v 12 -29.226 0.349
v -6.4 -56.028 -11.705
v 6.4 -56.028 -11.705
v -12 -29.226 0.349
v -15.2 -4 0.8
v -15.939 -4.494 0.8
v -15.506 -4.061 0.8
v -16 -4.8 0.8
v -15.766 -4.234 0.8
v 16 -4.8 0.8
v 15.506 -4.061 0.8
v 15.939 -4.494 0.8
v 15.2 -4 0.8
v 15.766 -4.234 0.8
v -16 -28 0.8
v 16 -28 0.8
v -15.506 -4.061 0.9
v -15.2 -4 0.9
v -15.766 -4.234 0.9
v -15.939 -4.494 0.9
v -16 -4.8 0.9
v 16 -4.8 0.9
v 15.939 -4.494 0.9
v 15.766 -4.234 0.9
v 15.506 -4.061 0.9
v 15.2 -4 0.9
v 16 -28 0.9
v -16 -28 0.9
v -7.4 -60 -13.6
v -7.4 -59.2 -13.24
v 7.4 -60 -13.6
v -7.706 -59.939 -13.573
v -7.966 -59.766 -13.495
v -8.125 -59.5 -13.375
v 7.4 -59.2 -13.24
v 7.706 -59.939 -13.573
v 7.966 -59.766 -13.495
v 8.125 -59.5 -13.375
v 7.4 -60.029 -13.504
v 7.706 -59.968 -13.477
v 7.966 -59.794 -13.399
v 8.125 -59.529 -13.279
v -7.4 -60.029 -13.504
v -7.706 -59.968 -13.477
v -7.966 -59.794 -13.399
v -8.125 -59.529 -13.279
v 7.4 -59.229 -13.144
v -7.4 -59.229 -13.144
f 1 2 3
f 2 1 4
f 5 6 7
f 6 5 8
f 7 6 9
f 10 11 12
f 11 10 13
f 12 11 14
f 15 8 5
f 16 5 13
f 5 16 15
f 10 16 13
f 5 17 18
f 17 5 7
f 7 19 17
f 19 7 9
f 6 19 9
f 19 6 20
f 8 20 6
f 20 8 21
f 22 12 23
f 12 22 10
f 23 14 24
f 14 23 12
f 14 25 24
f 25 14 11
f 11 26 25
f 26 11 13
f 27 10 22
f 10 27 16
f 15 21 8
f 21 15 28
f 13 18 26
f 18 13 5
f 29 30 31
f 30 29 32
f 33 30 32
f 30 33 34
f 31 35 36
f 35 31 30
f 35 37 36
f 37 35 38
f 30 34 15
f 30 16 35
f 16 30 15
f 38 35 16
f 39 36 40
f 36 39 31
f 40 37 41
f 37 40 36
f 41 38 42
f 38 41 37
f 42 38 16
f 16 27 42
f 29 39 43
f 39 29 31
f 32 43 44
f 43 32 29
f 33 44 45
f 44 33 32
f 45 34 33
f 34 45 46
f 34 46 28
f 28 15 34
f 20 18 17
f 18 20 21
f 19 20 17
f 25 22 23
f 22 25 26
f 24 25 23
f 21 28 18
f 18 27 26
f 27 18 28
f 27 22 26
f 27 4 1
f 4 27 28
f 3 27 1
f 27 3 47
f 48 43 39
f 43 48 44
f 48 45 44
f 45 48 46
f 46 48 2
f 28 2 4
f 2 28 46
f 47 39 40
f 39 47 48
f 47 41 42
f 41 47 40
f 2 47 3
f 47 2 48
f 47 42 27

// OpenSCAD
// file: ../p/1-4cyli.scad
use <../lib.scad>
function ldraw_lib__1_4cyli() = [
// 0 Cylinder 0.25
// 0 Name: 1-4cyli.dat
// 0 Author: James Jessiman
// 0 !LDRAW_ORG Primitive UPDATE 2012-01
// 0 !LICENSE Licensed under CC BY 4.0 : see CAreadme.txt
// 
// 0 BFC CERTIFY CCW
  [0,"BFC","CERTIFY"],
  [0,"BFC","CCW"],
// 
// 0 !HISTORY 2002-03-23 [sbliss] Added BFC statement.
// 0 !HISTORY 2002-04-25 [PTadmin] Official Update 2002-02
// 0 !HISTORY 2007-06-22 [PTadmin] Header formatted for Contributor Agreement
// 0 !HISTORY 2008-07-01 [PTadmin] Official Update 2008-01
// 0 !HISTORY 2012-02-16 [Philo] Changed to CCW
// 0 !HISTORY 2012-03-30 [PTadmin] Official Update 2012-01
// 
// 
// 4 16 1 1 0 0.9239 1 0.3827 0.9239 0 0.3827 1 0 0
  [4,16,1,1,0,0.9239,1,0.3827,0.9239,0,0.3827,1,0,0],
// 5 24 1 0 0 1 1 0 0.9239 0 0.3827 1 0 -1
  [5,24,1,0,0,1,1,0,0.9239,0,0.3827,1,0,-1],
// 4 16 0.9239 1 0.3827 0.7071 1 0.7071 0.7071 0 0.7071 0.9239 0 0.3827
  [4,16,0.9239,1,0.3827,0.7071,1,0.7071,0.7071,0,0.7071,0.9239,0,0.3827],
// 5 24 0.9239 0 0.3827 0.9239 1 0.3827 0.7071 0 0.7071 1 0 0
  [5,24,0.9239,0,0.3827,0.9239,1,0.3827,0.7071,0,0.7071,1,0,0],
// 4 16 0.7071 1 0.7071 0.3827 1 0.9239 0.3827 0 0.9239 0.7071 0 0.7071
  [4,16,0.7071,1,0.7071,0.3827,1,0.9239,0.3827,0,0.9239,0.7071,0,0.7071],
// 5 24 0.7071 0 0.7071 0.7071 1 0.7071 0.3827 0 0.9239 0.9239 0 0.3827
  [5,24,0.7071,0,0.7071,0.7071,1,0.7071,0.3827,0,0.9239,0.9239,0,0.3827],
// 4 16 0.3827 1 0.9239 0 1 1 0 0 1 0.3827 0 0.9239
  [4,16,0.3827,1,0.9239,0,1,1,0,0,1,0.3827,0,0.9239],
// 5 24 0.3827 0 0.9239 0.3827 1 0.9239 0 0 1 0.7071 0 0.7071
  [5,24,0.3827,0,0.9239,0.3827,1,0.9239,0,0,1,0.7071,0,0.7071],
// 5 24 0 0 1 0 1 1 0.3827 0 0.9239 -1 0 1
  [5,24,0,0,1,0,1,1,0.3827,0,0.9239,-1,0,1],
];
module ldraw_lib__1_4cyli(step=0, col=false, unit=2/5, alt=false, line=0.2, solid=!$preview)
    makepoly(ldraw_lib__1_4cyli(), step=step, col=col, unit=unit, alt=alt, line=line, solid=solid);
ldraw_lib__1_4cyli(line=0.2);
// file: ../p/1-4chrd.scad
use <../lib.scad>
function ldraw_lib__1_4chrd() = [
// 0 Chord 0.25
// 0 Name: 1-4chrd.dat
// 0 Author: Max Martin Richter [MMR1988]
// 0 !LDRAW_ORG Primitive UPDATE 2023-05
// 0 !LICENSE Licensed under CC BY 4.0 : see CAreadme.txt
// 
// 0 BFC CERTIFY CCW
  [0,"BFC","CERTIFY"],
  [0,"BFC","CCW"],
// 
// 0 !HISTORY 2004-04-22 [PTadmin] Official Update 2004-02
// 0 !HISTORY 2007-10-09 [PTadmin] Header formatted for Contributor Agreement
// 0 !HISTORY 2008-07-01 [PTadmin] Official Update 2008-01
// 0 !HISTORY 2012-08-02 [MMR1988] Re-creation with PrimGen2 and Rectifier
// 0 !HISTORY 2012-08-09 [PTadmin] Official Update 2012-02
// 0 !HISTORY 2023-10-27 [OrionP] Change author to MMR1988 from hafhead
// 0 !HISTORY 2023-10-31 [OrionP] Official Update 2023-05
// 
// 4 16 0.9239 0 0.3827 0.3827 0 0.9239 0 0 1 1 0 0
  [4,16,0.9239,0,0.3827,0.3827,0,0.9239,0,0,1,1,0,0],
// 3 16 0.7071 0 0.7071 0.3827 0 0.9239 0.9239 0 0.3827
  [3,16,0.7071,0,0.7071,0.3827,0,0.9239,0.9239,0,0.3827],
];
module ldraw_lib__1_4chrd(step=0, col=false, unit=2/5, alt=false, line=0.2, solid=!$preview)
    makepoly(ldraw_lib__1_4chrd(), step=step, col=col, unit=unit, alt=alt, line=line, solid=solid);
ldraw_lib__1_4chrd(line=0.2);
// main file
use <../lib.scad>
use <../p/1-4chrd.scad>
use <../p/1-4cyli.scad>
function ldraw_lib__4221407cc01() = [
// 0 Sticker  4.0 x  7.5 with SW Y-wing Cockpit Top (Formed)
// 0 Name: 4221407cc01.dat
// 0 Author: Evert-Jan Boer [ejboer]
// 0 !LDRAW_ORG Part UPDATE 2026-07
// 0 !LICENSE Licensed under CC BY 4.0 : see CAreadme.txt
// 
// 0 BFC CERTIFY CCW
  [0,"BFC","CERTIFY"],
  [0,"BFC","CCW"],
// 
// 0 !CATEGORY Sticker
// 0 !KEYWORDS Bricklink 10134stk01, Brickowl 230374, Rebrickable 48981, Set 10134
// 0 !KEYWORDS Star Wars, Y-Wing Starfighter
// 
// 0 !HISTORY 2026-07-30 [OrionP] Official Update 2026-07
// 
// 4 16 -30 -.8723 -73.0643 -16 29.2628 -140.071 16 29.2628 -140.071 30 -.8723 -73.0643
  [4,16,-30,-.8723,-73.0643,-16,29.2628,-140.071,16,29.2628,-140.071,30,-.8723,-73.0643],
// 
// 1 16 -38 -2 -12 0 0 -2 0 -1 0 2 0 0 1-4chrd.dat
  [1,16,-38,-2,-12,0,0,-2,0,-1,0,2,0,0, ldraw_lib__1_4chrd()],
// 1 16 38 -2 -12 2 0 0 0 -1 0 0 0 2 1-4chrd.dat
  [1,16,38,-2,-12,2,0,0,0,-1,0,0,0,2, ldraw_lib__1_4chrd()],
// 3 16 -40 -2 -70 -40 -2 -12 -38 -2 -10
  [3,16,-40,-2,-70,-40,-2,-12,-38,-2,-10],
// 4 16 -40 -2 -70 -38 -2 -10 38 -2 -10 40 -2 -70
  [4,16,-40,-2,-70,-38,-2,-10,38,-2,-10,40,-2,-70],
// 3 16 40 -2 -12 40 -2 -70 38 -2 -10
  [3,16,40,-2,-12,40,-2,-70,38,-2,-10],
// 
// 1 16 -38 -2 -12 0 0 -2 0 -.25 0 2 0 0 1-4cyli.dat
  [1,16,-38,-2,-12,0,0,-2,0,-.25,0,2,0,0, ldraw_lib__1_4cyli()],
// 1 16 38 -2 -12 2 0 0 0 -.25 0 0 0 2 1-4cyli.dat
  [1,16,38,-2,-12,2,0,0,0,-.25,0,0,0,2, ldraw_lib__1_4cyli()],
// 4 16 40 -2.25 -12 40 -2.2504 -70 40 -2 -70 40 -2 -12
  [4,16,40,-2.25,-12,40,-2.2504,-70,40,-2,-70,40,-2,-12],
// 4 16 -40 -2 -70 -40 -2.2504 -70 -40 -2.25 -12 -40 -2 -12
  [4,16,-40,-2,-70,-40,-2.2504,-70,-40,-2.25,-12,-40,-2,-12],
// 4 16 -38 -2.25 -10 38 -2.25 -10 38 -2 -10 -38 -2 -10
  [4,16,-38,-2.25,-10,38,-2.25,-10,38,-2,-10,-38,-2,-10],
// 
// 4 16 -19.2654 33.9315 -149.8478 -18.5 33.1 -148 18.5 34 -150 -18.5 34 -150
  [4,16,-19.2654,33.9315,-149.8478,-18.5,33.1,-148,18.5,34,-150,-18.5,34,-150],
// 4 16 -20.3123 33.4378 -148.7507 -18.5 33.1 -148 -19.2654 33.9315 -149.8478 -19.9142 33.7364 -149.4142
  [4,16,-20.3123,33.4378,-148.7507,-18.5,33.1,-148,-19.2654,33.9315,-149.8478,-19.9142,33.7364,-149.4142],
// 4 16 19.2654 33.9315 -149.8478 18.5 34 -150 -18.5 33.1 -148 18.5 33.1 -148
  [4,16,19.2654,33.9315,-149.8478,18.5,34,-150,-18.5,33.1,-148,18.5,33.1,-148],
// 4 16 20.3123 33.4378 -148.7507 19.9142 33.7364 -149.4142 19.2654 33.9315 -149.8478 18.5 33.1 -148
  [4,16,20.3123,33.4378,-148.7507,19.9142,33.7364,-149.4142,19.2654,33.9315,-149.8478,18.5,33.1,-148],
// 
// 3 16 -18.5 33.1 -148 -20.3123 33.4378 -148.7507 -40 -2 -70
  [3,16,-18.5,33.1,-148,-20.3123,33.4378,-148.7507,-40,-2,-70],
// 4 16 40 -2 -70 18.5 33.1 -148 -18.5 33.1 -148 -40 -2 -70
  [4,16,40,-2,-70,18.5,33.1,-148,-18.5,33.1,-148,-40,-2,-70],
// 3 16 20.3123 33.4378 -148.7507 18.5 33.1 -148 40 -2 -70
  [3,16,20.3123,33.4378,-148.7507,18.5,33.1,-148,40,-2,-70],
// 4 16 19.2654 33.6921 -149.9198 18.5 33.7606 -150.072 18.5 34 -150 19.2654 33.9315 -149.8478
  [4,16,19.2654,33.6921,-149.9198,18.5,33.7606,-150.072,18.5,34,-150,19.2654,33.9315,-149.8478],
// 4 16 19.9142 33.4971 -149.4861 19.2654 33.6921 -149.9198 19.2654 33.9315 -149.8478 19.9142 33.7364 -149.4142
  [4,16,19.9142,33.4971,-149.4861,19.2654,33.6921,-149.9198,19.2654,33.9315,-149.8478,19.9142,33.7364,-149.4142],
// 4 16 20.3123 33.1987 -148.8226 19.9142 33.4971 -149.4861 19.9142 33.7364 -149.4142 20.3123 33.4378 -148.7507
  [4,16,20.3123,33.1987,-148.8226,19.9142,33.4971,-149.4861,19.9142,33.7364,-149.4142,20.3123,33.4378,-148.7507],
// 3 16 20.3123 33.1987 -148.8226 20.3123 33.4378 -148.7507 40 -2 -70
  [3,16,20.3123,33.1987,-148.8226,20.3123,33.4378,-148.7507,40,-2,-70],
// 3 16 40 -2 -70 40 -2.2504 -70 20.3123 33.1987 -148.8226
  [3,16,40,-2,-70,40,-2.2504,-70,20.3123,33.1987,-148.8226],
// 4 16 18.5 34 -150 18.5 33.7606 -150.072 -18.5 33.7606 -150.072 -18.5 34 -150
  [4,16,18.5,34,-150,18.5,33.7606,-150.072,-18.5,33.7606,-150.072,-18.5,34,-150],
// 4 16 -18.5 33.7606 -150.072 -19.2654 33.6921 -149.9198 -19.2654 33.9315 -149.8478 -18.5 34 -150
  [4,16,-18.5,33.7606,-150.072,-19.2654,33.6921,-149.9198,-19.2654,33.9315,-149.8478,-18.5,34,-150],
// 4 16 -19.2654 33.6921 -149.9198 -19.9142 33.4971 -149.4861 -19.9142 33.7364 -149.4142 -19.2654 33.9315 -149.8478
  [4,16,-19.2654,33.6921,-149.9198,-19.9142,33.4971,-149.4861,-19.9142,33.7364,-149.4142,-19.2654,33.9315,-149.8478],
// 4 16 -19.9142 33.4971 -149.4861 -20.3123 33.1987 -148.8226 -20.3123 33.4378 -148.7507 -19.9142 33.7364 -149.4142
  [4,16,-19.9142,33.4971,-149.4861,-20.3123,33.1987,-148.8226,-20.3123,33.4378,-148.7507,-19.9142,33.7364,-149.4142],
// 3 16 -20.3123 33.4378 -148.7507 -20.3123 33.1987 -148.8226 -40 -2.2504 -70
  [3,16,-20.3123,33.4378,-148.7507,-20.3123,33.1987,-148.8226,-40,-2.2504,-70],
// 3 16 -40 -2.2504 -70 -40 -2 -70 -20.3123 33.4378 -148.7507
  [3,16,-40,-2.2504,-70,-40,-2,-70,-20.3123,33.4378,-148.7507],
// 
// 5 24 20.3123 33.1987 -148.8226 20.3123 33.4378 -148.7507 40 -2 -70 19.9142 33.4971 -149.4861
  [5,24,20.3123,33.1987,-148.8226,20.3123,33.4378,-148.7507,40,-2,-70,19.9142,33.4971,-149.4861],
// 5 24 18.5 33.7606 -150.072 18.5 34 -150 -18.5 33.7606 -150.072 19.2654 33.9315 -149.8478
  [5,24,18.5,33.7606,-150.072,18.5,34,-150,-18.5,33.7606,-150.072,19.2654,33.9315,-149.8478],
// 5 24 -20.3123 33.4378 -148.7507 -20.3123 33.1987 -148.8226 -19.9142 33.4971 -149.4861 -40 -2.2504 -70
  [5,24,-20.3123,33.4378,-148.7507,-20.3123,33.1987,-148.8226,-19.9142,33.4971,-149.4861,-40,-2.2504,-70],
// 5 24 -19.2654 33.9315 -149.8478 -19.2654 33.6921 -149.9198 -18.5 34 -150 -19.9142 33.4971 -149.4861
  [5,24,-19.2654,33.9315,-149.8478,-19.2654,33.6921,-149.9198,-18.5,34,-150,-19.9142,33.4971,-149.4861],
// 5 24 -18.5 34 -150 -18.5 33.7606 -150.072 -19.2654 33.6921 -149.9198 18.5 34 -150
  [5,24,-18.5,34,-150,-18.5,33.7606,-150.072,-19.2654,33.6921,-149.9198,18.5,34,-150],
// 5 24 19.9142 33.4971 -149.4861 19.9142 33.7364 -149.4142 19.2654 33.6921 -149.9198 20.3123 33.4378 -148.7507
  [5,24,19.9142,33.4971,-149.4861,19.9142,33.7364,-149.4142,19.2654,33.6921,-149.9198,20.3123,33.4378,-148.7507],
// 5 24 19.2654 33.9315 -149.8478 19.2654 33.6921 -149.9198 18.5 33.7606 -150.072 19.9142 33.7364 -149.4142
  [5,24,19.2654,33.9315,-149.8478,19.2654,33.6921,-149.9198,18.5,33.7606,-150.072,19.9142,33.7364,-149.4142],
// 5 24 -19.9142 33.4971 -149.4861 -19.9142 33.7364 -149.4142 -19.2654 33.9315 -149.8478 -20.3123 33.4378 -148.7507
  [5,24,-19.9142,33.4971,-149.4861,-19.9142,33.7364,-149.4142,-19.2654,33.9315,-149.8478,-20.3123,33.4378,-148.7507],
// 2 24 -40 -2.2504 -70 40 -2.2504 -70
  [2,24,-40,-2.2504,-70,40,-2.2504,-70],
// 5 24 40 -2 -70 40 -2.2504 -70 20.3123 33.1987 -148.8226 40 -2 -12
  [5,24,40,-2,-70,40,-2.2504,-70,20.3123,33.1987,-148.8226,40,-2,-12],
// 5 24 -40 -2.2504 -70 -40 -2 -70 -20.3123 33.4378 -148.7507 -40 -2.25 -12
  [5,24,-40,-2.2504,-70,-40,-2,-70,-20.3123,33.4378,-148.7507,-40,-2.25,-12],
// 
// 0 BFC NOCLIP
  [0,"BFC","NOCLIP"],
// 
// 1 15 -38 -2.25 -12 0 0 -2 0 1 0 2 0 0 1-4chrd.dat
  [1,15,-38,-2.25,-12,0,0,-2,0,1,0,2,0,0, ldraw_lib__1_4chrd()],
// 1 15 38 -2.25 -12 2 0 0 0 1 0 0 0 2 1-4chrd.dat
  [1,15,38,-2.25,-12,2,0,0,0,1,0,0,0,2, ldraw_lib__1_4chrd()],
// 3 15 -40 -2.25 -12 -40 -2.2504 -70 -38 -2.25 -10
  [3,15,-40,-2.25,-12,-40,-2.2504,-70,-38,-2.25,-10],
// 4 15 38 -2.25 -10 -38 -2.25 -10 -40 -2.2504 -70 40 -2.2504 -70
  [4,15,38,-2.25,-10,-38,-2.25,-10,-40,-2.2504,-70,40,-2.2504,-70],
// 3 15 40 -2.2504 -70 40 -2.25 -12 38 -2.25 -10
  [3,15,40,-2.2504,-70,40,-2.25,-12,38,-2.25,-10],
// 
// 4 15 40 -2.2504 -70 -40 -2.2504 -70 -30 -.8723 -73.0643 30 -.8723 -73.0643
  [4,15,40,-2.2504,-70,-40,-2.2504,-70,-30,-.8723,-73.0643,30,-.8723,-73.0643],
// 4 15 18.5 32.861 -148.0718 40 -2.2504 -70 30 -.8723 -73.0643 16 29.2628 -140.071
  [4,15,18.5,32.861,-148.0718,40,-2.2504,-70,30,-.8723,-73.0643,16,29.2628,-140.071],
// 4 15 18.5 33.7606 -150.072 -18.5 32.861 -148.0718 -19.2654 33.6921 -149.9198 -18.5 33.7606 -150.072
  [4,15,18.5,33.7606,-150.072,-18.5,32.861,-148.0718,-19.2654,33.6921,-149.9198,-18.5,33.7606,-150.072],
// 4 15 -19.2654 33.6921 -149.9198 -18.5 32.861 -148.0718 -20.3123 33.1987 -148.8226 -19.9142 33.4971 -149.4861
  [4,15,-19.2654,33.6921,-149.9198,-18.5,32.861,-148.0718,-20.3123,33.1987,-148.8226,-19.9142,33.4971,-149.4861],
// 3 15 -20.3123 33.1987 -148.8226 -18.5 32.861 -148.0718 -16 29.2628 -140.071
  [3,15,-20.3123,33.1987,-148.8226,-18.5,32.861,-148.0718,-16,29.2628,-140.071],
// 4 15 -30 -.8723 -73.0643 -40 -2.2504 -70 -20.3123 33.1987 -148.8226 -16 29.2628 -140.071
  [4,15,-30,-.8723,-73.0643,-40,-2.2504,-70,-20.3123,33.1987,-148.8226,-16,29.2628,-140.071],
// 4 15 -18.5 32.861 -148.0718 18.5 33.7606 -150.072 19.2654 33.6921 -149.9198 18.5 32.861 -148.0718
  [4,15,-18.5,32.861,-148.0718,18.5,33.7606,-150.072,19.2654,33.6921,-149.9198,18.5,32.861,-148.0718],
// 4 15 19.2654 33.6921 -149.9198 19.9142 33.4971 -149.4861 20.3123 33.1987 -148.8226 18.5 32.861 -148.0718
  [4,15,19.2654,33.6921,-149.9198,19.9142,33.4971,-149.4861,20.3123,33.1987,-148.8226,18.5,32.861,-148.0718],
// 4 15 -18.5 32.861 -148.0718 18.5 32.861 -148.0718 16 29.2628 -140.071 -16 29.2628 -140.071
  [4,15,-18.5,32.861,-148.0718,18.5,32.861,-148.0718,16,29.2628,-140.071,-16,29.2628,-140.071],
// 3 15 18.5 32.861 -148.0718 20.3123 33.1987 -148.8226 40 -2.2504 -70
  [3,15,18.5,32.861,-148.0718,20.3123,33.1987,-148.8226,40,-2.2504,-70],
];
module ldraw_lib__4221407cc01(step=0, col=false, unit=2/5, alt=false, line=0.2, solid=!$preview)
    makepoly(ldraw_lib__4221407cc01(), step=step, col=col, unit=unit, alt=alt, line=line, solid=solid);
ldraw_lib__4221407cc01(line=0.2);
